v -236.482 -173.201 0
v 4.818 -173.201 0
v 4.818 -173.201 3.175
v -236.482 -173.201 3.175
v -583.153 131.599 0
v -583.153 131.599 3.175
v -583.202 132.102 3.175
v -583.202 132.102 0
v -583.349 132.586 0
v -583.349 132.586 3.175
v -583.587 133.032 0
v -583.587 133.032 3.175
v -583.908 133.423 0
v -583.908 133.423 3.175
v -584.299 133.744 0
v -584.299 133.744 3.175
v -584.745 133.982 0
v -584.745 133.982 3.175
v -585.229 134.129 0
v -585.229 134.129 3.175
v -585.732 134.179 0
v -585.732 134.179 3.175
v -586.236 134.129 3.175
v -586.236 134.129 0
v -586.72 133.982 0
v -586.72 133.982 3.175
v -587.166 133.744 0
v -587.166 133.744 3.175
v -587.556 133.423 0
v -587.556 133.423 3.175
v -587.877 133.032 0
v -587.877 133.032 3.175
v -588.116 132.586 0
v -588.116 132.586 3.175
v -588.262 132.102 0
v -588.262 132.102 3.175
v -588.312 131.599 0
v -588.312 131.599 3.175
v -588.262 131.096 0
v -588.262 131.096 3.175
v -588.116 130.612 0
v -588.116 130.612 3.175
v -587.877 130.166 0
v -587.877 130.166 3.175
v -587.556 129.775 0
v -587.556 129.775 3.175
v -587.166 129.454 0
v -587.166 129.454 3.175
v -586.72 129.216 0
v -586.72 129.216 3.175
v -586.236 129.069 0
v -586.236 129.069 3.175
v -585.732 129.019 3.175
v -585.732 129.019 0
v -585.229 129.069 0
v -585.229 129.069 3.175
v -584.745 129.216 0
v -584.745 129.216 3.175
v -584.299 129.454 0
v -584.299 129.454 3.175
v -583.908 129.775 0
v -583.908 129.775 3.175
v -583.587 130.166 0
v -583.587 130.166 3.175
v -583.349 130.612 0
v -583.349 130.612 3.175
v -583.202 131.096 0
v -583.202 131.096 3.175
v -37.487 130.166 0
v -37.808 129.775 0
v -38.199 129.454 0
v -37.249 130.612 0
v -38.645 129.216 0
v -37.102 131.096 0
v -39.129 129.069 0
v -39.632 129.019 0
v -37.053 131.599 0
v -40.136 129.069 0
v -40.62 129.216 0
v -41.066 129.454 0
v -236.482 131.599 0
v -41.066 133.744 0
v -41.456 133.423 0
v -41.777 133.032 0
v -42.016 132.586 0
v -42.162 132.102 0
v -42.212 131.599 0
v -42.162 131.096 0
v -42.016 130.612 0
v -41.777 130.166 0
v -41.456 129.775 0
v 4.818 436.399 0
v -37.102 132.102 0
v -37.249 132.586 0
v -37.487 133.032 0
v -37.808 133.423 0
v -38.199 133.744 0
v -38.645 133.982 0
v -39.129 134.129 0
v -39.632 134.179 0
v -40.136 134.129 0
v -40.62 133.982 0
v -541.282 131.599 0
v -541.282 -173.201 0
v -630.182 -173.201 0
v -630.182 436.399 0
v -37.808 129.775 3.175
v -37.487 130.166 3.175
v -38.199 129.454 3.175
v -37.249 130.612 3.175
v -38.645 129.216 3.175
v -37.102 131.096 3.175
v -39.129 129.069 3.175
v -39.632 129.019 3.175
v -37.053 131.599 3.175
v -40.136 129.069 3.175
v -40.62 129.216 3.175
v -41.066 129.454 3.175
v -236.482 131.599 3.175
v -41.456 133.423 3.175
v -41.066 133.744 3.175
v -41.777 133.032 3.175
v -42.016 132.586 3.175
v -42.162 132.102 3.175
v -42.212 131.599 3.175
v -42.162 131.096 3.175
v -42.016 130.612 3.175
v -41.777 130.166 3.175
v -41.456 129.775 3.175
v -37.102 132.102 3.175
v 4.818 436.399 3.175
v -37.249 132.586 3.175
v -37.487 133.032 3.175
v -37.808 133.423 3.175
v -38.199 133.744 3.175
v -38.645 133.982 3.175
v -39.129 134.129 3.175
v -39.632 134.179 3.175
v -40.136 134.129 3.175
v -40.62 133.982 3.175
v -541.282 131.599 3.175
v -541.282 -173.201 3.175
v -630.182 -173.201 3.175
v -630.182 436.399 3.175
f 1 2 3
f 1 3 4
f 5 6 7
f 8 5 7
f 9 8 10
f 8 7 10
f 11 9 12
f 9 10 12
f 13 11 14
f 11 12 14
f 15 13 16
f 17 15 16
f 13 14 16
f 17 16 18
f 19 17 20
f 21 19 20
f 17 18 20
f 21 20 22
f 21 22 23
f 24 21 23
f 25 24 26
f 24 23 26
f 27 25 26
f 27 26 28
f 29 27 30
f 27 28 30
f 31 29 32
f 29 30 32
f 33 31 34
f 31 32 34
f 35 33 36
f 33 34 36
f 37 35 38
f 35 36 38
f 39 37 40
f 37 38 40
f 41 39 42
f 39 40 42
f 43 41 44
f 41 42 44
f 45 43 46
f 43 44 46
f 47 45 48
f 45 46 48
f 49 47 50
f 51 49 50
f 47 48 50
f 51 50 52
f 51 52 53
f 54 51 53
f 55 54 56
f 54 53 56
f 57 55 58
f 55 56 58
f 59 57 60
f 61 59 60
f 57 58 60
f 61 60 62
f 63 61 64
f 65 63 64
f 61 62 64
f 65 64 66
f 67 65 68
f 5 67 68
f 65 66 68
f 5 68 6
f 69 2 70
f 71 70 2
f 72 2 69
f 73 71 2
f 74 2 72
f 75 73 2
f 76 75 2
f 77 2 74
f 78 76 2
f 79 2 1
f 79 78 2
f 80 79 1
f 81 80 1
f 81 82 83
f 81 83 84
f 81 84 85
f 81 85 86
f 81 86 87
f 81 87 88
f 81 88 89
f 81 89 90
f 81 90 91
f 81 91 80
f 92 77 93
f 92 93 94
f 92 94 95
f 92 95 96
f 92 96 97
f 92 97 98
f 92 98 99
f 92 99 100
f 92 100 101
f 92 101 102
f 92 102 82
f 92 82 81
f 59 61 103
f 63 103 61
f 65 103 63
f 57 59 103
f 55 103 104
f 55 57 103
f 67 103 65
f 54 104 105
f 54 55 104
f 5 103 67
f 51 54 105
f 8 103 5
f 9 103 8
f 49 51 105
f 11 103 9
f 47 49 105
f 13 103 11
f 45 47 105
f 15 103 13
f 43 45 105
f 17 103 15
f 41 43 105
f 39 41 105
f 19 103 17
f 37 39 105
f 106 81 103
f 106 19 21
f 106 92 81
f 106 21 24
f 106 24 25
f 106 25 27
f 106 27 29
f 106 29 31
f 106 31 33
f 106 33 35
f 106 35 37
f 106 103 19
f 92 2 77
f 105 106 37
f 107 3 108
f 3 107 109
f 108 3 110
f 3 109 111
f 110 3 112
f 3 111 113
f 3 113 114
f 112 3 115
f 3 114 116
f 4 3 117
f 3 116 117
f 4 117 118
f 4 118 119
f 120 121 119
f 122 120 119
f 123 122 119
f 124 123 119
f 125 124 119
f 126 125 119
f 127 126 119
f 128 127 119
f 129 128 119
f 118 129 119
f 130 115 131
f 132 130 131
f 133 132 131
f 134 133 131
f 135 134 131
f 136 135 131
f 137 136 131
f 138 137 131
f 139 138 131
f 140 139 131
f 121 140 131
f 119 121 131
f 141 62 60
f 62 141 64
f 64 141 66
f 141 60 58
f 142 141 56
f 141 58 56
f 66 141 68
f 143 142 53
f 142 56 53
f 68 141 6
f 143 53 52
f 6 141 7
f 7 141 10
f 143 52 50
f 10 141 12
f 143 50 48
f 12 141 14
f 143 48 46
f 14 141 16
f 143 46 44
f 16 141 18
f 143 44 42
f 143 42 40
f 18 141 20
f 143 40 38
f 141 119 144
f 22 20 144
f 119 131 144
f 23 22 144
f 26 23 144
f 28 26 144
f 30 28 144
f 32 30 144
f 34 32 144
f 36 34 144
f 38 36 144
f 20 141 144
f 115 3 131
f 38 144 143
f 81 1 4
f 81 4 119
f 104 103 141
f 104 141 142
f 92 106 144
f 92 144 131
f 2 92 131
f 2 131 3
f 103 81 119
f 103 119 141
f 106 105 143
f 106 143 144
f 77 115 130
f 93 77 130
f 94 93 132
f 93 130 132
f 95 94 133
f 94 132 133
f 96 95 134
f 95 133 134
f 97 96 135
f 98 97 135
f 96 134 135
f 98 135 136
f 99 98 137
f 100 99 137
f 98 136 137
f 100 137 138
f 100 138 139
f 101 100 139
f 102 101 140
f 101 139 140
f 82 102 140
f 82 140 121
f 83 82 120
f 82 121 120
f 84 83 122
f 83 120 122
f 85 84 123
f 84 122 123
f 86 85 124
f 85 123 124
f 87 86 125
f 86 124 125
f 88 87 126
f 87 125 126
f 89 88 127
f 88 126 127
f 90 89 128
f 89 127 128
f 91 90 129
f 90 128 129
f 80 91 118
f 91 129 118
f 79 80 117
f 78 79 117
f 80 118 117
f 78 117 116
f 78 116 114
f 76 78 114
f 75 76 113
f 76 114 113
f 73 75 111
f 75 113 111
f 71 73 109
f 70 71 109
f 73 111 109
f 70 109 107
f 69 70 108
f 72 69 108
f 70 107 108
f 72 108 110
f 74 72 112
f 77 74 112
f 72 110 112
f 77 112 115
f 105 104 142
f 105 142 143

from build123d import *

# Parameters (mm, degrees)
BOSS_EXTRUDE1_DEPTH = 3.175
SKETCH2_R           = 2.5796875
CUT_EXTRUDE1_DEPTH  = 3.175


with BuildPart() as part:
    # Sketch1 → Boss-Extrude1 (new body)
    with BuildSketch(Plane.XY):
        Polygon((-630.182303707, 436.398885794), (4.817696293, 436.398885794), (4.817696293, -173.201114206), (-236.482303707, -173.201114206), (-236.482303707, 131.598885794), (-541.282303707, 131.598885794), (-541.282303707, -173.201114206), (-630.182303707, -173.201114206), align=None)
    extrude(amount=BOSS_EXTRUDE1_DEPTH)

    # Sketch2 → Cut-Extrude1 (cut)
    with BuildSketch(Plane.XY.offset(3.175)):
        with Locations((-585.732303707, 131.598885794)):
            Circle(SKETCH2_R)
        with Locations((-39.632303707, 131.598885794)):
            Circle(SKETCH2_R)
    extrude(amount=-CUT_EXTRUDE1_DEPTH, mode=Mode.SUBTRACT)


solid = part.part
